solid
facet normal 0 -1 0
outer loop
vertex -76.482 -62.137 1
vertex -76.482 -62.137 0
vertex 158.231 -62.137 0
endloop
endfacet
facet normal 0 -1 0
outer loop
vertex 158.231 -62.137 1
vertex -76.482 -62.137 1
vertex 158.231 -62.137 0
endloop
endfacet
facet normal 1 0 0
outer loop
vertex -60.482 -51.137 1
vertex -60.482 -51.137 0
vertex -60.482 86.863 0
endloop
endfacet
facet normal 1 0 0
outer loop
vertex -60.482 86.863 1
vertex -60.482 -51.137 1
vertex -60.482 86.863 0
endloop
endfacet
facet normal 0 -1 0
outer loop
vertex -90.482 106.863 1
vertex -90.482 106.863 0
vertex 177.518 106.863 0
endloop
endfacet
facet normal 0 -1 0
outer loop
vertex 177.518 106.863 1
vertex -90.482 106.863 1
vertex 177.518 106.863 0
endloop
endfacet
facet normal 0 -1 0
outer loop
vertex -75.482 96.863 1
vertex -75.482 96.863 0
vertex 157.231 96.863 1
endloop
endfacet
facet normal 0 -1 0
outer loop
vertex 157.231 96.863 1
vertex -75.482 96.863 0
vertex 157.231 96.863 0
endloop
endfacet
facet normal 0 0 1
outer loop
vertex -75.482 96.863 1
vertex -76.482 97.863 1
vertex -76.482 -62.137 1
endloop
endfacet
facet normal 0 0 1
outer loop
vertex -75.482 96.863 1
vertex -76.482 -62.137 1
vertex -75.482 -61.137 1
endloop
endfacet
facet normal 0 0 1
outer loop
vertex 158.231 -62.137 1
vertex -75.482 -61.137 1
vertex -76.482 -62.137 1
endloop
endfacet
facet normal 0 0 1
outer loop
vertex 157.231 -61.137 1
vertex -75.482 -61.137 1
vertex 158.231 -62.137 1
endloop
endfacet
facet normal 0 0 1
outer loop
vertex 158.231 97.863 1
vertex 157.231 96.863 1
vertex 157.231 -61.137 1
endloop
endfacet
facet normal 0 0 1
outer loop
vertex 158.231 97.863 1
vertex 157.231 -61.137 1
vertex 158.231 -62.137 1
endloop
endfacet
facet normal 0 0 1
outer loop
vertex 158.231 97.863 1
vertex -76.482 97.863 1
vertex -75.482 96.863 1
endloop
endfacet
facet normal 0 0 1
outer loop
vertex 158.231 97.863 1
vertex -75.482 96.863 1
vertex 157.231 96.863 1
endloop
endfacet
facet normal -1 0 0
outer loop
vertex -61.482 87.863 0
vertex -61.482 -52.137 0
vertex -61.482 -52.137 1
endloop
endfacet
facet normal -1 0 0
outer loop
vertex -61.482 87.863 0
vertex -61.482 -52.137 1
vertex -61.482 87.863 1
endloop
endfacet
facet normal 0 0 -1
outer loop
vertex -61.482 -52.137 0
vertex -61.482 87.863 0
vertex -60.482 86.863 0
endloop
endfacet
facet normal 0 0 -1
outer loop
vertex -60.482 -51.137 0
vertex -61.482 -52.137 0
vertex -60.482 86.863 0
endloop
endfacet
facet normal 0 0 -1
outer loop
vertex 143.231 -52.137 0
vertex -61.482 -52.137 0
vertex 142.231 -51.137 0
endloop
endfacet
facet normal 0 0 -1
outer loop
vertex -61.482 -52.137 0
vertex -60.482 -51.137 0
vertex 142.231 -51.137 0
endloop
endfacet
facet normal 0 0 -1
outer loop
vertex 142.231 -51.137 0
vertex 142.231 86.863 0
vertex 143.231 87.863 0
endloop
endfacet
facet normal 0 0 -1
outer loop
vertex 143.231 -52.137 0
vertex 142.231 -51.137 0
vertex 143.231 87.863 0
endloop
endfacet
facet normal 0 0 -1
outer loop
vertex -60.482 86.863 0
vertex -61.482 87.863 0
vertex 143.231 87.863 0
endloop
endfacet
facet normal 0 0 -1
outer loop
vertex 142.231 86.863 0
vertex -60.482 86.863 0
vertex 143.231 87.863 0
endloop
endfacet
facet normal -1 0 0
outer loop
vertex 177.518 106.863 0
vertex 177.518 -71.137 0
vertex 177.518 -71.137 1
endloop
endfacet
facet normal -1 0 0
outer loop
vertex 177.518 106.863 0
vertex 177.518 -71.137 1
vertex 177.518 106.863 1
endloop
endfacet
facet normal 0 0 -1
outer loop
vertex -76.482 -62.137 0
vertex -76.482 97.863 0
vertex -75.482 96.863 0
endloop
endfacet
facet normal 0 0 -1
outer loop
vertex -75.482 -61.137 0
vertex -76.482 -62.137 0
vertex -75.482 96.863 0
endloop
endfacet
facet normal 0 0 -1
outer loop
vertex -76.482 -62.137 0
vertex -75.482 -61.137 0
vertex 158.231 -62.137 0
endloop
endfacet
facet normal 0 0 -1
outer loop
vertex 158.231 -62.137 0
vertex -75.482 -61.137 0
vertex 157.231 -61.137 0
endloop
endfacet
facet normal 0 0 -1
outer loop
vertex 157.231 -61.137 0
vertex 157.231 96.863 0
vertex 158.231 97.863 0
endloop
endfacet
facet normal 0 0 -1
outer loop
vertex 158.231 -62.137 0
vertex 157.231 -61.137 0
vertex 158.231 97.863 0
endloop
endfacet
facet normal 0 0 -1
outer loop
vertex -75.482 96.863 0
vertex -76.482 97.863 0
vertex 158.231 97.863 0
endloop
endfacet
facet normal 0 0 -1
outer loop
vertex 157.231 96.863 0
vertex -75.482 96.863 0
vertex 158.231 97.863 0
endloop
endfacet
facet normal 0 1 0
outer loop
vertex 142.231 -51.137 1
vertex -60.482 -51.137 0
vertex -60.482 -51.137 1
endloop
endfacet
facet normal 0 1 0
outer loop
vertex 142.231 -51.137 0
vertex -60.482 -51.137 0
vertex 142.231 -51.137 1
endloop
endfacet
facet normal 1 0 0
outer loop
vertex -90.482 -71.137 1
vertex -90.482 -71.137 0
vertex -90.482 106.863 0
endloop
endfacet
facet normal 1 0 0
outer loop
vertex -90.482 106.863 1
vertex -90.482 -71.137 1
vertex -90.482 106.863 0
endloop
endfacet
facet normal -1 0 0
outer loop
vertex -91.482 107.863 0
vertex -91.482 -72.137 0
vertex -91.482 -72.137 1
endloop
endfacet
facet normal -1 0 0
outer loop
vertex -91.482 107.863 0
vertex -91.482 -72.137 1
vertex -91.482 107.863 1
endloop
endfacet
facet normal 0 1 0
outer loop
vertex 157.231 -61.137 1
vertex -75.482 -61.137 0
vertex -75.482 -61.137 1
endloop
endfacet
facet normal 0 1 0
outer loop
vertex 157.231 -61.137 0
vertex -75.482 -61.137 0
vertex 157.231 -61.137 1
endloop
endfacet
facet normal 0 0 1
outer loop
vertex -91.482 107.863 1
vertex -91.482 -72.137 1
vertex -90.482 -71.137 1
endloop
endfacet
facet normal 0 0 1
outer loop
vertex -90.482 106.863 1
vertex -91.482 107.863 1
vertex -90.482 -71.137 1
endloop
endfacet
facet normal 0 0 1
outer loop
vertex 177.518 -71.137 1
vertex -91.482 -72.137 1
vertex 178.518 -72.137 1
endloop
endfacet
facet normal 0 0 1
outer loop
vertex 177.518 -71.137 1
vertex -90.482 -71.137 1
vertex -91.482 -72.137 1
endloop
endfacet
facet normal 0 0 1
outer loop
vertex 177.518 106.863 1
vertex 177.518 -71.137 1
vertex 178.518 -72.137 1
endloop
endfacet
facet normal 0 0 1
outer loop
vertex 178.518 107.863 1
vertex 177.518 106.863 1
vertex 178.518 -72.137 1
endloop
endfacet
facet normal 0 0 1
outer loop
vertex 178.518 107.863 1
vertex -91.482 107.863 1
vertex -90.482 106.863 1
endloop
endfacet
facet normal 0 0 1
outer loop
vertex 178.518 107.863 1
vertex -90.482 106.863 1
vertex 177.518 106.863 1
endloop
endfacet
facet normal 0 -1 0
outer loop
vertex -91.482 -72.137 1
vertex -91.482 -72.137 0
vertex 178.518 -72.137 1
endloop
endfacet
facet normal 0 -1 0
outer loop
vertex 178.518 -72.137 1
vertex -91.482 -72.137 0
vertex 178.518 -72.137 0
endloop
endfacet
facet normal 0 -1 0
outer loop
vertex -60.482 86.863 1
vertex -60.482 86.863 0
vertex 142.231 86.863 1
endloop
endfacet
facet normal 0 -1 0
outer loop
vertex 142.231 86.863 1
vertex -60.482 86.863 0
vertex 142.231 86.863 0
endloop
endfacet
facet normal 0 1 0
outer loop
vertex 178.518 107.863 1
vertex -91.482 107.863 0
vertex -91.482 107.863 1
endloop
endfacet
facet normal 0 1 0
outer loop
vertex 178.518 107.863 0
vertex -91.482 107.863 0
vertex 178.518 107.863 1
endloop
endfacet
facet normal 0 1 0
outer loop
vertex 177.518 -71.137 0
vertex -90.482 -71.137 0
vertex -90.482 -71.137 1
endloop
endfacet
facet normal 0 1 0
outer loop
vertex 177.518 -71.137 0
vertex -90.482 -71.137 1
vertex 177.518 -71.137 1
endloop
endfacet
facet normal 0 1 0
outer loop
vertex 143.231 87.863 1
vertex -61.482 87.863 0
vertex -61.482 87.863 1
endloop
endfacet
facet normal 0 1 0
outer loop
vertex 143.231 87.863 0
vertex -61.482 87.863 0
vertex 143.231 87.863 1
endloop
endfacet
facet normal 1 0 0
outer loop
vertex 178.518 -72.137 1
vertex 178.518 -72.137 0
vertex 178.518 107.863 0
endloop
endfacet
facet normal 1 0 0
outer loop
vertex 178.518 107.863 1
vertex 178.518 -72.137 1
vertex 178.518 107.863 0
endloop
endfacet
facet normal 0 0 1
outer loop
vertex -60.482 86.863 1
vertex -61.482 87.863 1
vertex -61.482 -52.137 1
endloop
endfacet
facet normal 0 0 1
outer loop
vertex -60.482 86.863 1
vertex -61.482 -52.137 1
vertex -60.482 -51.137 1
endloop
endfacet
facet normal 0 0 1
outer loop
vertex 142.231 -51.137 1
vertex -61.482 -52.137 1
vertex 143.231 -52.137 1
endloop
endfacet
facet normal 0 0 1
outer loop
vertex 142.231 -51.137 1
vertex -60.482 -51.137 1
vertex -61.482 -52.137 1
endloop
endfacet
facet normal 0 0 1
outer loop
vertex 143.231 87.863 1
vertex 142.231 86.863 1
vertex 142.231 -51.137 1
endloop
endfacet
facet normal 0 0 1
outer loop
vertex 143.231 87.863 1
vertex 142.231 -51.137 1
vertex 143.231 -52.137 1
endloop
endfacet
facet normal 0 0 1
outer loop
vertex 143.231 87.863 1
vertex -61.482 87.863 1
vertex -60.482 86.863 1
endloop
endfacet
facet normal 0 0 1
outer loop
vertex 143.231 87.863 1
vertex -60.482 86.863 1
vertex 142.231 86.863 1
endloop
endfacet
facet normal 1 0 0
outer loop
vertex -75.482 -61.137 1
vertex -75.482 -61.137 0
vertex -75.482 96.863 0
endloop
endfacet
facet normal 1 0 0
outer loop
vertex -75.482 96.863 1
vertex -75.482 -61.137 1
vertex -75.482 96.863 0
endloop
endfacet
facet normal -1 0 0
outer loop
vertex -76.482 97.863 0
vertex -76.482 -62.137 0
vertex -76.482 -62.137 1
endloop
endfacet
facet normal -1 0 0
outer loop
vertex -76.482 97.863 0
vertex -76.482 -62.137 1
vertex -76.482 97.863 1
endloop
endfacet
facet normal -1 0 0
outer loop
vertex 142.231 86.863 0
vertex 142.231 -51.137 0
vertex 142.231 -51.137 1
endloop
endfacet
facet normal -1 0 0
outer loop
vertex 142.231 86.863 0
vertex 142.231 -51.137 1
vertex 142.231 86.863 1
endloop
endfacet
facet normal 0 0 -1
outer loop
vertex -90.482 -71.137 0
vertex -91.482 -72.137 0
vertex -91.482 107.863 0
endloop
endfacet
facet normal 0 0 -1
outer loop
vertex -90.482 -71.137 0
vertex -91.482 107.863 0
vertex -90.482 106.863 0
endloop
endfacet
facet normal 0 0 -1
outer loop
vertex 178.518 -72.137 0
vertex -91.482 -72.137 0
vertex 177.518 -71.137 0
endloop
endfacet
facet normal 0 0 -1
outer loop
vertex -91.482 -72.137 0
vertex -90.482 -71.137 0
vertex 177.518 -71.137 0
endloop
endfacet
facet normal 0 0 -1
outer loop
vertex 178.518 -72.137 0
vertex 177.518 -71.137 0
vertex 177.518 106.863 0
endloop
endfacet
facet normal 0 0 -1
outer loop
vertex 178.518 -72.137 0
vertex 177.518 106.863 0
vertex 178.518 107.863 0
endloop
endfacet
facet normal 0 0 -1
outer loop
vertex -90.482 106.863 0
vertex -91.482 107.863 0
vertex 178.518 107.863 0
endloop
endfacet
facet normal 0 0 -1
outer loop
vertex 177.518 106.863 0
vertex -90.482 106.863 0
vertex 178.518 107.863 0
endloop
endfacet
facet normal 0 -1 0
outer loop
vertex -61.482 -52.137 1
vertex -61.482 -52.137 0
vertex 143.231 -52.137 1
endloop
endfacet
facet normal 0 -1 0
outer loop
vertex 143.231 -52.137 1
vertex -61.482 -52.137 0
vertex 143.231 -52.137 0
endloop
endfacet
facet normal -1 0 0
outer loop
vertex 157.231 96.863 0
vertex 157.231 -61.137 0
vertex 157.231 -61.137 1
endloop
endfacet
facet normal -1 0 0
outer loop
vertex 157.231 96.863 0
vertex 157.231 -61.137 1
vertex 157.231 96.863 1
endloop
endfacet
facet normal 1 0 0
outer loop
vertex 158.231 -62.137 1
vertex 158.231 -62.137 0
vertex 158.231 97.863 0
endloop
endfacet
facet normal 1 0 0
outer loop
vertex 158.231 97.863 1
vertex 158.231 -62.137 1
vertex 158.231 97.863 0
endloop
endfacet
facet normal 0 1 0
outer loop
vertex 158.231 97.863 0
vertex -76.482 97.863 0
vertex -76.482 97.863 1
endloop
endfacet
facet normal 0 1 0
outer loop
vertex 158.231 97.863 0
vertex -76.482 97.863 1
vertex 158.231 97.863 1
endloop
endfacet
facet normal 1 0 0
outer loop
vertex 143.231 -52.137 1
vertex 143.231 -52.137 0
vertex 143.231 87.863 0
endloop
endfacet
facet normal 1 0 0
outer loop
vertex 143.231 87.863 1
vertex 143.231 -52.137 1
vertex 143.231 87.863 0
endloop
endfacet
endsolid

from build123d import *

# Parameters (mm, degrees)
F1_W     = 270
F1_H     = 180
F1_W_2   = 268
F1_H_2   = 178
F2_DEPTH = 1
F1_W_3   = 234.7133469
F1_H_3   = 160
F1_W_4   = 232.7133469
F1_H_4   = 158
F1_W_5   = 204.7133469
F1_H_5   = 140
F1_W_6   = 202.7133469
F1_H_6   = 138


# Not quite as in the source:
# - a feature names something its author has since deleted; it is built from what else it names


with BuildPart() as f2:
    # F1 (on Top) → F2 (new body)
    with BuildSketch(Plane.XY):
        with Locations((43.5175617039, 17.8632308638)):
            Rectangle(F1_W, F1_H)
        with Locations((43.5175617039, 17.8632308638)):
            Rectangle(F1_W_2, F1_H_2, mode=Mode.SUBTRACT)
    extrude(amount=F2_DEPTH)


with BuildPart() as f2b:
    # F1 (on Top) → F2, piece 2 (new body)
    with BuildSketch(Plane.XY):
        with Locations((40.8742351539, 17.8632308638)):
            Rectangle(F1_W_3, F1_H_3)
        with Locations((40.8742351539, 17.8632308638)):
            Rectangle(F1_W_4, F1_H_4, mode=Mode.SUBTRACT)
    extrude(amount=F2_DEPTH)


with BuildPart() as f2c:
    # F1 (on Top) → F2, piece 3 (new body)
    with BuildSketch(Plane.XY):
        with Locations((40.8742351539, 17.8632308638)):
            Rectangle(F1_W_5, F1_H_5)
        with Locations((40.8742351539, 17.8632308638)):
            Rectangle(F1_W_6, F1_H_6, mode=Mode.SUBTRACT)
    extrude(amount=F2_DEPTH)


solid = Compound([f2.part, f2b.part, f2c.part])
